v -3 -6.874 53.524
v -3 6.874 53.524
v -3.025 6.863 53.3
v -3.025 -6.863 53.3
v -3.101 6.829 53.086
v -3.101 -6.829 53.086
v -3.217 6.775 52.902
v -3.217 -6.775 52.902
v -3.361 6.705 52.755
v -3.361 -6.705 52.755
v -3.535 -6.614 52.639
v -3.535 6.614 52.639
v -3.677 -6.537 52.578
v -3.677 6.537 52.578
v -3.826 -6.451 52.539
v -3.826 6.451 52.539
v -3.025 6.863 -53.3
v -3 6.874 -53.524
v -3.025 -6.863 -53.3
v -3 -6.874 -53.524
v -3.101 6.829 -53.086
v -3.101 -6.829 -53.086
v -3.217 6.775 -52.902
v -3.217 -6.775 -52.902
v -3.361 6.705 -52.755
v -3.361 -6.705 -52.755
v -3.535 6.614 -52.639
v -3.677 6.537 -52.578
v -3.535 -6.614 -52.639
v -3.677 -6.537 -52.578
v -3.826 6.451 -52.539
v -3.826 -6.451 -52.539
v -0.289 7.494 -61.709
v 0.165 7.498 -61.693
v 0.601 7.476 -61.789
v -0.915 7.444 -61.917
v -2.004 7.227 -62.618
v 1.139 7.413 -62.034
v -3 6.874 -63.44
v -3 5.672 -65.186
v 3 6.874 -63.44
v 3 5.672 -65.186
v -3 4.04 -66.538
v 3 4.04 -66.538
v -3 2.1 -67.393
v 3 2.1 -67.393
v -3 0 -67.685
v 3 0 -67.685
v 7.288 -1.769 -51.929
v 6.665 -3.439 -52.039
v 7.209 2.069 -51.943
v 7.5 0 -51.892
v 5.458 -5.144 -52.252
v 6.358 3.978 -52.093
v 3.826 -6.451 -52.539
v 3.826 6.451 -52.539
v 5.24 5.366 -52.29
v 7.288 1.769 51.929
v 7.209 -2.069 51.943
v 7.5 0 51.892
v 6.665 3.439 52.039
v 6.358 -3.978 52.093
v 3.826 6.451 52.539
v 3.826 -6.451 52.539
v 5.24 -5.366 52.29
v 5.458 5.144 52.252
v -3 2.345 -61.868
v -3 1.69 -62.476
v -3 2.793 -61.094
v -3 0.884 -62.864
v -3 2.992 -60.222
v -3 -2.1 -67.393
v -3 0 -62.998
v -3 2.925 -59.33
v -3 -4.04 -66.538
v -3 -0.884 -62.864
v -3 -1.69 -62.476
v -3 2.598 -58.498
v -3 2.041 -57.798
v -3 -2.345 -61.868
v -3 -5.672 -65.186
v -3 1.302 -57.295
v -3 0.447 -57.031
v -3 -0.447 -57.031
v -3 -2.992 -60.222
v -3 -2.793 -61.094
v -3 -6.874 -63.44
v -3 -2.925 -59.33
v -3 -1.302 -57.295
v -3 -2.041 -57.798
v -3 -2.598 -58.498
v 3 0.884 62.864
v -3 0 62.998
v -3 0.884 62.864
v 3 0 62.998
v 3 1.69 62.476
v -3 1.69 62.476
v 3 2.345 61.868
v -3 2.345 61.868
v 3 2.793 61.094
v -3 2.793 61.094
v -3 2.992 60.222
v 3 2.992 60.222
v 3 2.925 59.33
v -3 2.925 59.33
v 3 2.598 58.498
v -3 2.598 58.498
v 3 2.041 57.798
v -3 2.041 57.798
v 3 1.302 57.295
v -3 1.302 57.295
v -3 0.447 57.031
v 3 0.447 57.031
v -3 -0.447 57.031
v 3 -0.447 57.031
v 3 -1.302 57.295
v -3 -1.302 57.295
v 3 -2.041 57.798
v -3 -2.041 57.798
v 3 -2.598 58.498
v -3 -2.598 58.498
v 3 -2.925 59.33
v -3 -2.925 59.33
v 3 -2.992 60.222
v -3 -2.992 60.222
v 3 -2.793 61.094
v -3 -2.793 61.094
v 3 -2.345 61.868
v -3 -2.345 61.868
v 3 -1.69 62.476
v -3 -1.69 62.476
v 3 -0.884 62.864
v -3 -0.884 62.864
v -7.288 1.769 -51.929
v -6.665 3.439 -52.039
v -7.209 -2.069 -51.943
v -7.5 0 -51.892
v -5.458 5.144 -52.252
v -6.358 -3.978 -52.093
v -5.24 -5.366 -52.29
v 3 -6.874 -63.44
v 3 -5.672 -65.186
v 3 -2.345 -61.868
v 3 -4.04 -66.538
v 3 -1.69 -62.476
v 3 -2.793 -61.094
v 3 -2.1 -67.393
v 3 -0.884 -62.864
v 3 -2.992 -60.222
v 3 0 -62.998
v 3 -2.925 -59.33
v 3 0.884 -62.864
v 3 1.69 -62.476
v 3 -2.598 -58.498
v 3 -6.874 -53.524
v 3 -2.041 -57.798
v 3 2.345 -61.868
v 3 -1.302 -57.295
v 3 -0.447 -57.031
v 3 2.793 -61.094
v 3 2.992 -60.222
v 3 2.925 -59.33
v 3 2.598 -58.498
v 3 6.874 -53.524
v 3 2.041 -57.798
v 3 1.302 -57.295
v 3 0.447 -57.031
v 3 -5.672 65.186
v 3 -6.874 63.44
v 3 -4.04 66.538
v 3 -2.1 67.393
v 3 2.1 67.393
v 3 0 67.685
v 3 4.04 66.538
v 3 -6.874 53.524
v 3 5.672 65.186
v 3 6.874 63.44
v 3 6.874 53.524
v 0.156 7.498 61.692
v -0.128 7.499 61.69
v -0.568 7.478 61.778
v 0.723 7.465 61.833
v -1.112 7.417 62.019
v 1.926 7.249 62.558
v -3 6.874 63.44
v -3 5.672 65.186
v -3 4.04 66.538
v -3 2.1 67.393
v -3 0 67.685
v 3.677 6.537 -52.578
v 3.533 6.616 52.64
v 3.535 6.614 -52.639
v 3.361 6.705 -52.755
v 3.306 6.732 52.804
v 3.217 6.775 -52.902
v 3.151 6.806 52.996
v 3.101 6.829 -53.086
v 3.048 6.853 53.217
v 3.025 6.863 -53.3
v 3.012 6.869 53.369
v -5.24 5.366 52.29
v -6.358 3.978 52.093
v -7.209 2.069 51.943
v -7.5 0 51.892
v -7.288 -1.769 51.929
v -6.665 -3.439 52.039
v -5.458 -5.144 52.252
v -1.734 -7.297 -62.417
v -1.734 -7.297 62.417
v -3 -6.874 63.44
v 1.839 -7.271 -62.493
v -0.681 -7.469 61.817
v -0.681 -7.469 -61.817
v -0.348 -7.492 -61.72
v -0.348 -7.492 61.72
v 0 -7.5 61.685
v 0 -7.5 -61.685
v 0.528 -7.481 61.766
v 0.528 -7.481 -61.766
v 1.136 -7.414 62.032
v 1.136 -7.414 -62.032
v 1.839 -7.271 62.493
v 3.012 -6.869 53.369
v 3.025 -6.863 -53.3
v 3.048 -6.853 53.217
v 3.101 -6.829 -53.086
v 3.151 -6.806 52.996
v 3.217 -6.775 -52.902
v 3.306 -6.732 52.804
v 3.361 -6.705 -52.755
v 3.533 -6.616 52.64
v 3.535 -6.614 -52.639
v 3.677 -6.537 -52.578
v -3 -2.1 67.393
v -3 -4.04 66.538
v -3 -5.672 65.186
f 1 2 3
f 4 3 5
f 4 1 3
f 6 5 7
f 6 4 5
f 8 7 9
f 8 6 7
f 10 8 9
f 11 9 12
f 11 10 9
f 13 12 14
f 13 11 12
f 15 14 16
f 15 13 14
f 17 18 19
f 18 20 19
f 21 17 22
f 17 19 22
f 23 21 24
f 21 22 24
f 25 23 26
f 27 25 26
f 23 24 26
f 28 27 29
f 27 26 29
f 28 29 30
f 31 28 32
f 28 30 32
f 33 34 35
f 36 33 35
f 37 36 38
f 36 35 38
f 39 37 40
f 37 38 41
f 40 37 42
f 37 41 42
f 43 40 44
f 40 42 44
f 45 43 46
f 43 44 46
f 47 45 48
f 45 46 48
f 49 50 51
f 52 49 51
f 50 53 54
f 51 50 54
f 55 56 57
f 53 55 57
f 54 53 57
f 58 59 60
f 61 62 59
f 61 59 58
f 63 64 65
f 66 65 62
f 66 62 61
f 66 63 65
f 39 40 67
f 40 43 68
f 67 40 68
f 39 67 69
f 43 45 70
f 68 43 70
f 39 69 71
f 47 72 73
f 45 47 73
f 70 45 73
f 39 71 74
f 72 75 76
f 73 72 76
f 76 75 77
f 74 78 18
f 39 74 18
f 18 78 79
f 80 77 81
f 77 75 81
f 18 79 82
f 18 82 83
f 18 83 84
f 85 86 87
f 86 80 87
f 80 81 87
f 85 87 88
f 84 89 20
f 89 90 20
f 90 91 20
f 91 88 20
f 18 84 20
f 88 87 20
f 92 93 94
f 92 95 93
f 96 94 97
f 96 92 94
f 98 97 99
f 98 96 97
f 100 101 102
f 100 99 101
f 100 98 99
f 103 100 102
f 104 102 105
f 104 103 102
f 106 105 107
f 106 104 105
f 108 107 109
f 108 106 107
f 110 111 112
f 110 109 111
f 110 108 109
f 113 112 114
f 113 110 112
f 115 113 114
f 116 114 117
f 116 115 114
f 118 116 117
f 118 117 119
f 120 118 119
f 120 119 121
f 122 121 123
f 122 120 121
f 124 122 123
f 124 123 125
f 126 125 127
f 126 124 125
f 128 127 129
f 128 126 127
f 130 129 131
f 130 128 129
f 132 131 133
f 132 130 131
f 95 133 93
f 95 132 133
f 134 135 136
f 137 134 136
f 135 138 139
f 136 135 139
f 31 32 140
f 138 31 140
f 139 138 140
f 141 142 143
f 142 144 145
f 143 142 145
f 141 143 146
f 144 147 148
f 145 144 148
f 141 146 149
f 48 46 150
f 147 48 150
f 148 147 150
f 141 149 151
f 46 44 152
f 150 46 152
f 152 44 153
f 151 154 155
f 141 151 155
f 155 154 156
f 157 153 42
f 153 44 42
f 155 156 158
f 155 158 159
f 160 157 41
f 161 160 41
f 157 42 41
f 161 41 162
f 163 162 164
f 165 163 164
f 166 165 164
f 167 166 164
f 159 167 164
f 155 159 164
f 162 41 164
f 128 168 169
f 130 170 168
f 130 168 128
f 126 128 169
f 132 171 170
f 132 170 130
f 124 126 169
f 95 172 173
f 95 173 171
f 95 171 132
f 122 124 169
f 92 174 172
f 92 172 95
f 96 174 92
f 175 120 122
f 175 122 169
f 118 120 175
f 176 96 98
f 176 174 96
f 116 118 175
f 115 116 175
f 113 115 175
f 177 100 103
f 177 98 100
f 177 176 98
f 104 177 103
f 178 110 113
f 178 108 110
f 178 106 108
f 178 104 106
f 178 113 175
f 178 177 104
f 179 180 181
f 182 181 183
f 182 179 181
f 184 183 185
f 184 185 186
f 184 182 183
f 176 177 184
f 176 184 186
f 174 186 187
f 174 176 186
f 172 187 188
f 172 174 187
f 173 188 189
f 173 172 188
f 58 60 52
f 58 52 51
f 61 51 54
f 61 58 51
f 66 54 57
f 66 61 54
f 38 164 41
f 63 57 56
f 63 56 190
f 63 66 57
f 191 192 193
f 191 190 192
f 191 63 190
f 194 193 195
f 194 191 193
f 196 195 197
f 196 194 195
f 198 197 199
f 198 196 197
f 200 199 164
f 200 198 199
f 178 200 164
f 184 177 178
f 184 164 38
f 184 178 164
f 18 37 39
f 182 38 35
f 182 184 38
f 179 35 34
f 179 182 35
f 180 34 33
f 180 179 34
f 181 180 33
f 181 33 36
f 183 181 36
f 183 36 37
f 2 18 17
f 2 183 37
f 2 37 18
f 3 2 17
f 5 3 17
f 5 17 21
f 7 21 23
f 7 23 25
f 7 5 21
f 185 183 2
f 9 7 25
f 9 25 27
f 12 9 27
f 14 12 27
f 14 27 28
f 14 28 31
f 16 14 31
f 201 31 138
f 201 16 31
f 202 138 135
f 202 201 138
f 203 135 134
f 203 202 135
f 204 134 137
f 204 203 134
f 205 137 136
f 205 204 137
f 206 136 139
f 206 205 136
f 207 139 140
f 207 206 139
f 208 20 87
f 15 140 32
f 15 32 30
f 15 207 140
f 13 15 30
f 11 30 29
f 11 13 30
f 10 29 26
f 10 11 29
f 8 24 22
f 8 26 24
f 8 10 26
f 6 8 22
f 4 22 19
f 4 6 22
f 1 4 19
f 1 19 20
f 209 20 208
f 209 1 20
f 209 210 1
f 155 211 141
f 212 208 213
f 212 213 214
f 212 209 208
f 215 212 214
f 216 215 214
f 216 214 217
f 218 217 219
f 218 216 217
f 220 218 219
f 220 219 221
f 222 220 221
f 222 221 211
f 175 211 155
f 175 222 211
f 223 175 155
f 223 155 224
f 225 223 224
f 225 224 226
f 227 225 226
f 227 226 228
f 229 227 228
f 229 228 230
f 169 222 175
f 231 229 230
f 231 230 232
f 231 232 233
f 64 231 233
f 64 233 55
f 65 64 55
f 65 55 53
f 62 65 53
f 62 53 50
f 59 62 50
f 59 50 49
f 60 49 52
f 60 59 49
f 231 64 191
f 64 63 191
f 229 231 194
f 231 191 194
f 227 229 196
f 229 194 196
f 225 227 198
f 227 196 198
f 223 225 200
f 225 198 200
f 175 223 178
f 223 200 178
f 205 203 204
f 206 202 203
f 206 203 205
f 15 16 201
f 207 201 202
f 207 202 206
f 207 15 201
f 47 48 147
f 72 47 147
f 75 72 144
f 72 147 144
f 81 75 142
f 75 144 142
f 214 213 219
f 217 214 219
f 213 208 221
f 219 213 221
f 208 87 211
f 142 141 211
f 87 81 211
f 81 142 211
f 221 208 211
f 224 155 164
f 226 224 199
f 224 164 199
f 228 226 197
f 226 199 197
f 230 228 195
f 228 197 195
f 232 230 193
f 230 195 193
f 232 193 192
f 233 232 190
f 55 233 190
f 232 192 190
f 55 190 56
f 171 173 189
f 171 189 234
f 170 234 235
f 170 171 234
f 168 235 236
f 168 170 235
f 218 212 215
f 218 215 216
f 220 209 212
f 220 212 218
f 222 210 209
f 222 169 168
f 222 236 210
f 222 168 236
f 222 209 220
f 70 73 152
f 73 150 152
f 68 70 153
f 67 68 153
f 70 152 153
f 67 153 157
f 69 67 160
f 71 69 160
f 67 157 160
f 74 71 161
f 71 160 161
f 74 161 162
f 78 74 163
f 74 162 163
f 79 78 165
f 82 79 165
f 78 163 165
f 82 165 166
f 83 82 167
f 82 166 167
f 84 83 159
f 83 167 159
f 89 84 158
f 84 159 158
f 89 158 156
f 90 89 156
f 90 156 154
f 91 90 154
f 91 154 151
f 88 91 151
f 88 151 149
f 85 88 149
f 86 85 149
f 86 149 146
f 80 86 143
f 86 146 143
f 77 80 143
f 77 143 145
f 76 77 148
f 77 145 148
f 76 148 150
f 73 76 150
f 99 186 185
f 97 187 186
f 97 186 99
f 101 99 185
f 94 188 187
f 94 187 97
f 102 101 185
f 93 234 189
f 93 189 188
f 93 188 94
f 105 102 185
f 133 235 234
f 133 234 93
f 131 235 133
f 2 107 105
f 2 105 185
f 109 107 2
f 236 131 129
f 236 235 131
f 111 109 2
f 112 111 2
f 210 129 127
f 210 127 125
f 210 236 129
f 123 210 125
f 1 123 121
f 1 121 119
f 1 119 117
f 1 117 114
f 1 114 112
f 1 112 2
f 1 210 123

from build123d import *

# Parameters (mm, degrees)
SKETCH1_R            = 7.5
BOSS_EXTRUDE1_DEPTH  = 67.685
CUT_EXTRUDE2_DEPTH   = 69.511015355
CUT_EXTRUDE3_DEPTH   = 69.511015476
SKETCH8_R            = 3
CUT_EXTRUDE4_DEPTH   = 69.903985677
FILLET1_R            = 1
FILLET1_OF_MIRROR2_R = 1


with BuildPart() as part:
    # Sketch1 → Boss-Extrude1 (new, symmetric)
    with BuildSketch(Plane.XY):
        Circle(SKETCH1_R)
    extrude(amount=BOSS_EXTRUDE1_DEPTH, both=True)

    # Sketch6 → Cut-Extrude2 (cut, symmetric)
    with BuildSketch(Plane(origin=(0, 0, 0), x_dir=(0, 0, -1), z_dir=(1, 0, 0))):
        with BuildLine():
            Line((67.685, 0), (67.685, 7.5))
            Line((67.685, 7.5), (61.685, 7.5))
            ThreePointArc((61.685, 7.5), (66.000428973, 4.802343178), (67.685, 0))
        make_face()
        with BuildLine():
            Line((67.685, -7.5), (67.685, 0))
            ThreePointArc((67.685, 0), (66.000428973, -4.802343178), (61.685, -7.5))
            Line((61.685, -7.5), (67.685, -7.5))
        make_face()
    cut_extrude2 = extrude(amount=CUT_EXTRUDE2_DEPTH, both=True, mode=Mode.SUBTRACT)

    # Sketch7 → Cut-Extrude3 (cut, symmetric)
    with BuildSketch(Plane(origin=(0, 0, 0), x_dir=(1, 0, 0), z_dir=(0, 1, 0))):
        Polygon((-3, 67.685), (-3, 52.685), (-7.5, 51.891528587), (-7.5, 67.685), align=None)
        Polygon((7.5, 67.685), (3, 67.685), (3, 52.685), (7.5, 51.891528587), align=None)
    cut_extrude3 = extrude(amount=CUT_EXTRUDE3_DEPTH, both=True, mode=Mode.SUBTRACT)

    # Sketch8 → Cut-Extrude4 (cut, symmetric)
    with BuildSketch(Plane(origin=(-3, 0, 0), x_dir=(0, 0, -1), z_dir=(1, 0, 0))):
        with Locations((59.9975, 0)):
            Circle(SKETCH8_R)
    cut_extrude4 = extrude(amount=CUT_EXTRUDE4_DEPTH, both=True, mode=Mode.SUBTRACT)

    # Fillet1
    fillet1_edges = [part.edges().sort_by_distance(p)[0] for p in [
        (-3, 0, -52.685),
        (3, 0, -52.685),
    ]]
    fillet(fillet1_edges, radius=FILLET1_R)

    # Mirror2: Cut-Extrude2, Cut-Extrude3, Cut-Extrude4 across plane
    add(cut_extrude2.mirror(Plane.XY), mode=Mode.SUBTRACT)
    add(cut_extrude3.mirror(Plane.XY), mode=Mode.SUBTRACT)
    add(cut_extrude4.mirror(Plane.XY), mode=Mode.SUBTRACT)

    # Fillet1 of Mirror2
    fillet1_of_mirror2_edges = [part.edges().sort_by_distance(p)[0] for p in [
        (-3, 0, 52.685),
        (3, 0, 52.685),
    ]]
    fillet(fillet1_of_mirror2_edges, radius=FILLET1_OF_MIRROR2_R)


solid = part.part
